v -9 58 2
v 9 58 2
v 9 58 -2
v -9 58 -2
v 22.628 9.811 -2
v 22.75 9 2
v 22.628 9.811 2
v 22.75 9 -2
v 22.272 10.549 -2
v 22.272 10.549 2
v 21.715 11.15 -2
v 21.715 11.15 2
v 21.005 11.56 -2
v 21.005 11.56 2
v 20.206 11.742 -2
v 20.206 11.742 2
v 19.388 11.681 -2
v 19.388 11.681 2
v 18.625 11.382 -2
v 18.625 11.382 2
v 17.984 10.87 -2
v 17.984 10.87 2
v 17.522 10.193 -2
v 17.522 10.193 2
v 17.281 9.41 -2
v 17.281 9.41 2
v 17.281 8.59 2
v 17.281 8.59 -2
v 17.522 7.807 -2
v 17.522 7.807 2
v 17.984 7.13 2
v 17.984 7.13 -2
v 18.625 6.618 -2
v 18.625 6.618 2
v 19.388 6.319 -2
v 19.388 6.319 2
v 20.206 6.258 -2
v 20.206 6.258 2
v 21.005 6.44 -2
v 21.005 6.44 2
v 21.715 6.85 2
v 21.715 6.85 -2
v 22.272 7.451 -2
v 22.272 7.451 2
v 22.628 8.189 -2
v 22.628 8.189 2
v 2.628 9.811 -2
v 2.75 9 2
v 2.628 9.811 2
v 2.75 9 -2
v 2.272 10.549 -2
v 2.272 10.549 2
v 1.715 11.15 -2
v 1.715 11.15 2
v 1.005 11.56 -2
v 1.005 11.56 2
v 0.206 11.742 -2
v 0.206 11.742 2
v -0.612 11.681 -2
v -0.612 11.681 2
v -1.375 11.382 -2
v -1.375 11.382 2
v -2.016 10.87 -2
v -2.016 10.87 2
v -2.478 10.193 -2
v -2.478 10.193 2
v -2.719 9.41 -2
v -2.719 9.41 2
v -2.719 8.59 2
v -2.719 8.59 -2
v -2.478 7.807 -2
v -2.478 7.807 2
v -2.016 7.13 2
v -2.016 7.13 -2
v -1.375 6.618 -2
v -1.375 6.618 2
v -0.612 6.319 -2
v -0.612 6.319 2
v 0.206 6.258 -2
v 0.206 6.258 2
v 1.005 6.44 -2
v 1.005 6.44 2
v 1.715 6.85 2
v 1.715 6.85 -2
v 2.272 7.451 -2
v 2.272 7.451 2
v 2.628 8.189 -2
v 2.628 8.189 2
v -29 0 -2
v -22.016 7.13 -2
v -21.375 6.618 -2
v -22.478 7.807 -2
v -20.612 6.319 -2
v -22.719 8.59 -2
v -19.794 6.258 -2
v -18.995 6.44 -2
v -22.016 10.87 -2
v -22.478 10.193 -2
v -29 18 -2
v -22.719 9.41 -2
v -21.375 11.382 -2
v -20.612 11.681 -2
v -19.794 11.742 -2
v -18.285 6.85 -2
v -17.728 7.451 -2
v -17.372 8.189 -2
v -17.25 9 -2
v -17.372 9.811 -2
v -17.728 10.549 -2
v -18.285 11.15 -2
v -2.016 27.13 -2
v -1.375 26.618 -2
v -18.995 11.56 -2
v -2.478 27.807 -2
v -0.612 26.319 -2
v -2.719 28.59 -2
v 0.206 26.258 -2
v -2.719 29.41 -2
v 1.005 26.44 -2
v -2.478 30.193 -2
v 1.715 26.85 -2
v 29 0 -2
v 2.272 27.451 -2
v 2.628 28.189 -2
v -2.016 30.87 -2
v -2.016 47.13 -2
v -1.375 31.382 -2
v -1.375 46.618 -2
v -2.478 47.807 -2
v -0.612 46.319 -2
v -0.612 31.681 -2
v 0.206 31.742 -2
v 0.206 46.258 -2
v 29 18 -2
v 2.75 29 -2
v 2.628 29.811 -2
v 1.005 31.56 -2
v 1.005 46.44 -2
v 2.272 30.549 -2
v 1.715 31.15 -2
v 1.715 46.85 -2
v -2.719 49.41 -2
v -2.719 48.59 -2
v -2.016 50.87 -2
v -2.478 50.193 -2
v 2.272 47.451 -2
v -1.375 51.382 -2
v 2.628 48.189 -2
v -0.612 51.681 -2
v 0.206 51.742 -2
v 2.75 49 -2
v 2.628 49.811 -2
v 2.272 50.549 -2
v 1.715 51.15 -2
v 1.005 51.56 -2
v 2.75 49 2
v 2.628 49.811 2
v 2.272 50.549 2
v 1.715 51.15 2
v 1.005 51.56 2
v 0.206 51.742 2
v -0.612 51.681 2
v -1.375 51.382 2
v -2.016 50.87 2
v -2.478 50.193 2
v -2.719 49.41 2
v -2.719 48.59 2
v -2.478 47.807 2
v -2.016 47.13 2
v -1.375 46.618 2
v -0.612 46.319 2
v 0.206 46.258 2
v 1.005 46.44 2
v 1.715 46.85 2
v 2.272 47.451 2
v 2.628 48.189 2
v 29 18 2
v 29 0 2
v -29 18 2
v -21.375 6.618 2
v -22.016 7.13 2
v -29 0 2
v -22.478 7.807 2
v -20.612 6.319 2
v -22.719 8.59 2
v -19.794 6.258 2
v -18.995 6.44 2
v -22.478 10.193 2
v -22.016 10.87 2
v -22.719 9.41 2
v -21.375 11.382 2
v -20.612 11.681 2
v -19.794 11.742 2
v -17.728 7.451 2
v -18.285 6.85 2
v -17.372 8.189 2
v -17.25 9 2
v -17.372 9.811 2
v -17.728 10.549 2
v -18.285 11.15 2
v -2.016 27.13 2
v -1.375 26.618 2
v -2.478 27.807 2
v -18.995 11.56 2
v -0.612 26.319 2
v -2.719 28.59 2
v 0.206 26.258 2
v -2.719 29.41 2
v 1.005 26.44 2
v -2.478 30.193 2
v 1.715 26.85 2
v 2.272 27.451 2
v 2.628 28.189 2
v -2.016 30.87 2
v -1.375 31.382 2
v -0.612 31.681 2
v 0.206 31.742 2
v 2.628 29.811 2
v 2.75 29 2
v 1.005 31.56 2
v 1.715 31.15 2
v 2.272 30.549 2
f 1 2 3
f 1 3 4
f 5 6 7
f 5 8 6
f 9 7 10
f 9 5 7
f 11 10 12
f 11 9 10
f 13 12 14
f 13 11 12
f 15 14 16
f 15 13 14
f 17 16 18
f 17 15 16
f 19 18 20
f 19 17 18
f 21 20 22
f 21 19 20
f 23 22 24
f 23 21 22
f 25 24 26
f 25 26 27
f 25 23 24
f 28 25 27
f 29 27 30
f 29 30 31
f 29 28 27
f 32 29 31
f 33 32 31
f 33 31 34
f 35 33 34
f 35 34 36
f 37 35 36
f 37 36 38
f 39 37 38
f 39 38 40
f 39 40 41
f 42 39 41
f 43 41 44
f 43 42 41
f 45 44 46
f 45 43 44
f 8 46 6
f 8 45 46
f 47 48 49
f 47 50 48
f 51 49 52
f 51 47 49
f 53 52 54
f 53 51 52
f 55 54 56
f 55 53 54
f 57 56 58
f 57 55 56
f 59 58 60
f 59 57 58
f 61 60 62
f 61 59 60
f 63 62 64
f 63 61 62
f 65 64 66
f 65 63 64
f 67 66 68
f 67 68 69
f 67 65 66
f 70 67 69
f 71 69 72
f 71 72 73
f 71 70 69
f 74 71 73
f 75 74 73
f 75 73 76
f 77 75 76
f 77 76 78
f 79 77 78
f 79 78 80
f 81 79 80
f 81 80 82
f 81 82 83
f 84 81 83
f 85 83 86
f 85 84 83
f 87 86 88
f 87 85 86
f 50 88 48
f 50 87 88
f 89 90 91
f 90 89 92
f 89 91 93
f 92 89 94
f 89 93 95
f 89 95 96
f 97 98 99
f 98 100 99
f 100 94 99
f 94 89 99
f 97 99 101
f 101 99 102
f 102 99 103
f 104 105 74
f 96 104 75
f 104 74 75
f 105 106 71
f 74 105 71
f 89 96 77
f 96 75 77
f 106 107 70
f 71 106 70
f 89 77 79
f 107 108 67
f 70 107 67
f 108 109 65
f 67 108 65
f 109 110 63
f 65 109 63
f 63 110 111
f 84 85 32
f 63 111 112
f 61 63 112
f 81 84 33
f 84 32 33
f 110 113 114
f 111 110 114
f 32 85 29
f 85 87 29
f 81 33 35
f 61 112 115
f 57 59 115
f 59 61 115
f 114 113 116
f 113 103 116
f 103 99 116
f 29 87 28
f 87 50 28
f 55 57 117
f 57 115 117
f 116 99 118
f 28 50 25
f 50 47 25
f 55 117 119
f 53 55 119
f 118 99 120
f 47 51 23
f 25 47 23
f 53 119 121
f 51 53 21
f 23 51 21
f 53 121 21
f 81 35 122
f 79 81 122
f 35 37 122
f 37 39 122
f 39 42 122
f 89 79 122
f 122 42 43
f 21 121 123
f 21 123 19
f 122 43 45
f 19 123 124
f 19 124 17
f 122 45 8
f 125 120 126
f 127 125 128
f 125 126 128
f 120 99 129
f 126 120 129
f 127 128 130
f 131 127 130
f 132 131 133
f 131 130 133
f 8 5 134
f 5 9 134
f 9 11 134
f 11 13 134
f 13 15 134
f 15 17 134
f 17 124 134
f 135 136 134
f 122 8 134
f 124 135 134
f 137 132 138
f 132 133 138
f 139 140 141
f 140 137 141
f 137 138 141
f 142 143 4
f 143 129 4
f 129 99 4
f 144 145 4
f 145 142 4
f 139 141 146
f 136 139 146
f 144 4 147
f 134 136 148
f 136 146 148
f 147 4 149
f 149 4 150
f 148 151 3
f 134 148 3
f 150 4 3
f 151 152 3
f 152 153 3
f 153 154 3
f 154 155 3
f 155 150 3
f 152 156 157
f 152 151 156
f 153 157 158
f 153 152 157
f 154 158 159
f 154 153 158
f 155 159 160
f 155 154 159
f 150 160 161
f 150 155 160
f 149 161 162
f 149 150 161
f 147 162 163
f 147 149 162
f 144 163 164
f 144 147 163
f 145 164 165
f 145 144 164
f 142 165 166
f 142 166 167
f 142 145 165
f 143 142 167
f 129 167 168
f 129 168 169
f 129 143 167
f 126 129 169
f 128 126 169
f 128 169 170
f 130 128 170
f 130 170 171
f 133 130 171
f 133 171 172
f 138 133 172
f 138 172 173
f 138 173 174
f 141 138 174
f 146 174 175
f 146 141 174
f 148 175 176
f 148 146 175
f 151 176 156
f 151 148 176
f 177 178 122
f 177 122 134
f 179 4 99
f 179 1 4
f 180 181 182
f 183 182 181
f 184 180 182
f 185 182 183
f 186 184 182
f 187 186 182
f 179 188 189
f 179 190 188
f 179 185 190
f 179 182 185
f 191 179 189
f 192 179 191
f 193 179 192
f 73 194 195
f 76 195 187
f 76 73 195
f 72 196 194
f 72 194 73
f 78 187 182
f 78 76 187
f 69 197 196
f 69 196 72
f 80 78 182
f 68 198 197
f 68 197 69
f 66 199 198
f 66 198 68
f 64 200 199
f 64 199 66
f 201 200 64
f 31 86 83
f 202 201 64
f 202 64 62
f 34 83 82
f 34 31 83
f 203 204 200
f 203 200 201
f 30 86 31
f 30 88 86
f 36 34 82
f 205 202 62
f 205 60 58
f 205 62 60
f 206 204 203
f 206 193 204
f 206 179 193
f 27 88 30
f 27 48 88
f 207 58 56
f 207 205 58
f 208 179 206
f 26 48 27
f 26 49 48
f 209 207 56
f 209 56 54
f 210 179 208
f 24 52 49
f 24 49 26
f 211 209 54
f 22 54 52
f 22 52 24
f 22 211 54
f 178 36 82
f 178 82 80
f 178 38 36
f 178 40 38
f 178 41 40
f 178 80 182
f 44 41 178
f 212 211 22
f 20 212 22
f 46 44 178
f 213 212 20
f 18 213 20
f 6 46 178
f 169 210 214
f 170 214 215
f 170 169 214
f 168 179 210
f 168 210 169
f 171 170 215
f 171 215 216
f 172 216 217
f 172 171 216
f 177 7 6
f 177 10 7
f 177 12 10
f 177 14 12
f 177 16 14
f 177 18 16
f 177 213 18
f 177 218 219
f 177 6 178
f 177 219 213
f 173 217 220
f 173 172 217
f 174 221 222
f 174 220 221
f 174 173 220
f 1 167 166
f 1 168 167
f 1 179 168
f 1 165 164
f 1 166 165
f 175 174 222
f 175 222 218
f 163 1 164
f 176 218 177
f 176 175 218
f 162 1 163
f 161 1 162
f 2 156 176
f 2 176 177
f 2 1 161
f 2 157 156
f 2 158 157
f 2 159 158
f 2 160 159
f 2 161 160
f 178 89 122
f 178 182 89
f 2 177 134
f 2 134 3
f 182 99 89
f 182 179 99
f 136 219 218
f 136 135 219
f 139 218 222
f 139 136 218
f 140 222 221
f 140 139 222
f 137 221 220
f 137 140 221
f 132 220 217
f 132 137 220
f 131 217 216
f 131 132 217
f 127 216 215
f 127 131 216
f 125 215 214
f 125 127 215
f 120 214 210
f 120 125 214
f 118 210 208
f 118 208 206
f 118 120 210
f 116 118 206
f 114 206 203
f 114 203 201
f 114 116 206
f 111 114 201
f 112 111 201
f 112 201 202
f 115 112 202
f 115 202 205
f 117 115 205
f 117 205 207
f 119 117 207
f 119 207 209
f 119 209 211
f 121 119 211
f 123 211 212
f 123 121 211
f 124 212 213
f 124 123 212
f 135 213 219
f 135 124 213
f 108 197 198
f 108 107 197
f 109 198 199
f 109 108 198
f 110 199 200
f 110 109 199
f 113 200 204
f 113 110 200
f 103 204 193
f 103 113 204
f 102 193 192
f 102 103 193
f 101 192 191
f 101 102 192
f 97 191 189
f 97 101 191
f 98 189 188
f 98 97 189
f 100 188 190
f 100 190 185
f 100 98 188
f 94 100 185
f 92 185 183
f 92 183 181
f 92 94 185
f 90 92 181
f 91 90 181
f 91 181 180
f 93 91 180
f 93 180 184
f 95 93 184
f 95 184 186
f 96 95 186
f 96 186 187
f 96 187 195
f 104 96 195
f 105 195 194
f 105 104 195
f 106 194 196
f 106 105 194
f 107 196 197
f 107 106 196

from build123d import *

# Parameters (mm, degrees)
SKETCH1_R           = 2.75
BOSS_EXTRUDE1_DEPTH = 2


with BuildPart() as part:
    # Sketch1 → Boss-Extrude1 (new body, symmetric)
    with BuildSketch(Plane.XY):
        Polygon((-29, 0), (29, 0), (29, 18), (9, 58), (-9, 58), (-29, 18), align=None)
        with Locations((0, 9)):
            Circle(SKETCH1_R, mode=Mode.SUBTRACT)
        with Locations((-20, 9)):
            Circle(SKETCH1_R, mode=Mode.SUBTRACT)
        with Locations((20, 9)):
            Circle(SKETCH1_R, mode=Mode.SUBTRACT)
        with Locations((0, 29)):
            Circle(SKETCH1_R, mode=Mode.SUBTRACT)
        with Locations((0, 49)):
            Circle(SKETCH1_R, mode=Mode.SUBTRACT)
    extrude(amount=BOSS_EXTRUDE1_DEPTH, both=True)


solid = part.part
